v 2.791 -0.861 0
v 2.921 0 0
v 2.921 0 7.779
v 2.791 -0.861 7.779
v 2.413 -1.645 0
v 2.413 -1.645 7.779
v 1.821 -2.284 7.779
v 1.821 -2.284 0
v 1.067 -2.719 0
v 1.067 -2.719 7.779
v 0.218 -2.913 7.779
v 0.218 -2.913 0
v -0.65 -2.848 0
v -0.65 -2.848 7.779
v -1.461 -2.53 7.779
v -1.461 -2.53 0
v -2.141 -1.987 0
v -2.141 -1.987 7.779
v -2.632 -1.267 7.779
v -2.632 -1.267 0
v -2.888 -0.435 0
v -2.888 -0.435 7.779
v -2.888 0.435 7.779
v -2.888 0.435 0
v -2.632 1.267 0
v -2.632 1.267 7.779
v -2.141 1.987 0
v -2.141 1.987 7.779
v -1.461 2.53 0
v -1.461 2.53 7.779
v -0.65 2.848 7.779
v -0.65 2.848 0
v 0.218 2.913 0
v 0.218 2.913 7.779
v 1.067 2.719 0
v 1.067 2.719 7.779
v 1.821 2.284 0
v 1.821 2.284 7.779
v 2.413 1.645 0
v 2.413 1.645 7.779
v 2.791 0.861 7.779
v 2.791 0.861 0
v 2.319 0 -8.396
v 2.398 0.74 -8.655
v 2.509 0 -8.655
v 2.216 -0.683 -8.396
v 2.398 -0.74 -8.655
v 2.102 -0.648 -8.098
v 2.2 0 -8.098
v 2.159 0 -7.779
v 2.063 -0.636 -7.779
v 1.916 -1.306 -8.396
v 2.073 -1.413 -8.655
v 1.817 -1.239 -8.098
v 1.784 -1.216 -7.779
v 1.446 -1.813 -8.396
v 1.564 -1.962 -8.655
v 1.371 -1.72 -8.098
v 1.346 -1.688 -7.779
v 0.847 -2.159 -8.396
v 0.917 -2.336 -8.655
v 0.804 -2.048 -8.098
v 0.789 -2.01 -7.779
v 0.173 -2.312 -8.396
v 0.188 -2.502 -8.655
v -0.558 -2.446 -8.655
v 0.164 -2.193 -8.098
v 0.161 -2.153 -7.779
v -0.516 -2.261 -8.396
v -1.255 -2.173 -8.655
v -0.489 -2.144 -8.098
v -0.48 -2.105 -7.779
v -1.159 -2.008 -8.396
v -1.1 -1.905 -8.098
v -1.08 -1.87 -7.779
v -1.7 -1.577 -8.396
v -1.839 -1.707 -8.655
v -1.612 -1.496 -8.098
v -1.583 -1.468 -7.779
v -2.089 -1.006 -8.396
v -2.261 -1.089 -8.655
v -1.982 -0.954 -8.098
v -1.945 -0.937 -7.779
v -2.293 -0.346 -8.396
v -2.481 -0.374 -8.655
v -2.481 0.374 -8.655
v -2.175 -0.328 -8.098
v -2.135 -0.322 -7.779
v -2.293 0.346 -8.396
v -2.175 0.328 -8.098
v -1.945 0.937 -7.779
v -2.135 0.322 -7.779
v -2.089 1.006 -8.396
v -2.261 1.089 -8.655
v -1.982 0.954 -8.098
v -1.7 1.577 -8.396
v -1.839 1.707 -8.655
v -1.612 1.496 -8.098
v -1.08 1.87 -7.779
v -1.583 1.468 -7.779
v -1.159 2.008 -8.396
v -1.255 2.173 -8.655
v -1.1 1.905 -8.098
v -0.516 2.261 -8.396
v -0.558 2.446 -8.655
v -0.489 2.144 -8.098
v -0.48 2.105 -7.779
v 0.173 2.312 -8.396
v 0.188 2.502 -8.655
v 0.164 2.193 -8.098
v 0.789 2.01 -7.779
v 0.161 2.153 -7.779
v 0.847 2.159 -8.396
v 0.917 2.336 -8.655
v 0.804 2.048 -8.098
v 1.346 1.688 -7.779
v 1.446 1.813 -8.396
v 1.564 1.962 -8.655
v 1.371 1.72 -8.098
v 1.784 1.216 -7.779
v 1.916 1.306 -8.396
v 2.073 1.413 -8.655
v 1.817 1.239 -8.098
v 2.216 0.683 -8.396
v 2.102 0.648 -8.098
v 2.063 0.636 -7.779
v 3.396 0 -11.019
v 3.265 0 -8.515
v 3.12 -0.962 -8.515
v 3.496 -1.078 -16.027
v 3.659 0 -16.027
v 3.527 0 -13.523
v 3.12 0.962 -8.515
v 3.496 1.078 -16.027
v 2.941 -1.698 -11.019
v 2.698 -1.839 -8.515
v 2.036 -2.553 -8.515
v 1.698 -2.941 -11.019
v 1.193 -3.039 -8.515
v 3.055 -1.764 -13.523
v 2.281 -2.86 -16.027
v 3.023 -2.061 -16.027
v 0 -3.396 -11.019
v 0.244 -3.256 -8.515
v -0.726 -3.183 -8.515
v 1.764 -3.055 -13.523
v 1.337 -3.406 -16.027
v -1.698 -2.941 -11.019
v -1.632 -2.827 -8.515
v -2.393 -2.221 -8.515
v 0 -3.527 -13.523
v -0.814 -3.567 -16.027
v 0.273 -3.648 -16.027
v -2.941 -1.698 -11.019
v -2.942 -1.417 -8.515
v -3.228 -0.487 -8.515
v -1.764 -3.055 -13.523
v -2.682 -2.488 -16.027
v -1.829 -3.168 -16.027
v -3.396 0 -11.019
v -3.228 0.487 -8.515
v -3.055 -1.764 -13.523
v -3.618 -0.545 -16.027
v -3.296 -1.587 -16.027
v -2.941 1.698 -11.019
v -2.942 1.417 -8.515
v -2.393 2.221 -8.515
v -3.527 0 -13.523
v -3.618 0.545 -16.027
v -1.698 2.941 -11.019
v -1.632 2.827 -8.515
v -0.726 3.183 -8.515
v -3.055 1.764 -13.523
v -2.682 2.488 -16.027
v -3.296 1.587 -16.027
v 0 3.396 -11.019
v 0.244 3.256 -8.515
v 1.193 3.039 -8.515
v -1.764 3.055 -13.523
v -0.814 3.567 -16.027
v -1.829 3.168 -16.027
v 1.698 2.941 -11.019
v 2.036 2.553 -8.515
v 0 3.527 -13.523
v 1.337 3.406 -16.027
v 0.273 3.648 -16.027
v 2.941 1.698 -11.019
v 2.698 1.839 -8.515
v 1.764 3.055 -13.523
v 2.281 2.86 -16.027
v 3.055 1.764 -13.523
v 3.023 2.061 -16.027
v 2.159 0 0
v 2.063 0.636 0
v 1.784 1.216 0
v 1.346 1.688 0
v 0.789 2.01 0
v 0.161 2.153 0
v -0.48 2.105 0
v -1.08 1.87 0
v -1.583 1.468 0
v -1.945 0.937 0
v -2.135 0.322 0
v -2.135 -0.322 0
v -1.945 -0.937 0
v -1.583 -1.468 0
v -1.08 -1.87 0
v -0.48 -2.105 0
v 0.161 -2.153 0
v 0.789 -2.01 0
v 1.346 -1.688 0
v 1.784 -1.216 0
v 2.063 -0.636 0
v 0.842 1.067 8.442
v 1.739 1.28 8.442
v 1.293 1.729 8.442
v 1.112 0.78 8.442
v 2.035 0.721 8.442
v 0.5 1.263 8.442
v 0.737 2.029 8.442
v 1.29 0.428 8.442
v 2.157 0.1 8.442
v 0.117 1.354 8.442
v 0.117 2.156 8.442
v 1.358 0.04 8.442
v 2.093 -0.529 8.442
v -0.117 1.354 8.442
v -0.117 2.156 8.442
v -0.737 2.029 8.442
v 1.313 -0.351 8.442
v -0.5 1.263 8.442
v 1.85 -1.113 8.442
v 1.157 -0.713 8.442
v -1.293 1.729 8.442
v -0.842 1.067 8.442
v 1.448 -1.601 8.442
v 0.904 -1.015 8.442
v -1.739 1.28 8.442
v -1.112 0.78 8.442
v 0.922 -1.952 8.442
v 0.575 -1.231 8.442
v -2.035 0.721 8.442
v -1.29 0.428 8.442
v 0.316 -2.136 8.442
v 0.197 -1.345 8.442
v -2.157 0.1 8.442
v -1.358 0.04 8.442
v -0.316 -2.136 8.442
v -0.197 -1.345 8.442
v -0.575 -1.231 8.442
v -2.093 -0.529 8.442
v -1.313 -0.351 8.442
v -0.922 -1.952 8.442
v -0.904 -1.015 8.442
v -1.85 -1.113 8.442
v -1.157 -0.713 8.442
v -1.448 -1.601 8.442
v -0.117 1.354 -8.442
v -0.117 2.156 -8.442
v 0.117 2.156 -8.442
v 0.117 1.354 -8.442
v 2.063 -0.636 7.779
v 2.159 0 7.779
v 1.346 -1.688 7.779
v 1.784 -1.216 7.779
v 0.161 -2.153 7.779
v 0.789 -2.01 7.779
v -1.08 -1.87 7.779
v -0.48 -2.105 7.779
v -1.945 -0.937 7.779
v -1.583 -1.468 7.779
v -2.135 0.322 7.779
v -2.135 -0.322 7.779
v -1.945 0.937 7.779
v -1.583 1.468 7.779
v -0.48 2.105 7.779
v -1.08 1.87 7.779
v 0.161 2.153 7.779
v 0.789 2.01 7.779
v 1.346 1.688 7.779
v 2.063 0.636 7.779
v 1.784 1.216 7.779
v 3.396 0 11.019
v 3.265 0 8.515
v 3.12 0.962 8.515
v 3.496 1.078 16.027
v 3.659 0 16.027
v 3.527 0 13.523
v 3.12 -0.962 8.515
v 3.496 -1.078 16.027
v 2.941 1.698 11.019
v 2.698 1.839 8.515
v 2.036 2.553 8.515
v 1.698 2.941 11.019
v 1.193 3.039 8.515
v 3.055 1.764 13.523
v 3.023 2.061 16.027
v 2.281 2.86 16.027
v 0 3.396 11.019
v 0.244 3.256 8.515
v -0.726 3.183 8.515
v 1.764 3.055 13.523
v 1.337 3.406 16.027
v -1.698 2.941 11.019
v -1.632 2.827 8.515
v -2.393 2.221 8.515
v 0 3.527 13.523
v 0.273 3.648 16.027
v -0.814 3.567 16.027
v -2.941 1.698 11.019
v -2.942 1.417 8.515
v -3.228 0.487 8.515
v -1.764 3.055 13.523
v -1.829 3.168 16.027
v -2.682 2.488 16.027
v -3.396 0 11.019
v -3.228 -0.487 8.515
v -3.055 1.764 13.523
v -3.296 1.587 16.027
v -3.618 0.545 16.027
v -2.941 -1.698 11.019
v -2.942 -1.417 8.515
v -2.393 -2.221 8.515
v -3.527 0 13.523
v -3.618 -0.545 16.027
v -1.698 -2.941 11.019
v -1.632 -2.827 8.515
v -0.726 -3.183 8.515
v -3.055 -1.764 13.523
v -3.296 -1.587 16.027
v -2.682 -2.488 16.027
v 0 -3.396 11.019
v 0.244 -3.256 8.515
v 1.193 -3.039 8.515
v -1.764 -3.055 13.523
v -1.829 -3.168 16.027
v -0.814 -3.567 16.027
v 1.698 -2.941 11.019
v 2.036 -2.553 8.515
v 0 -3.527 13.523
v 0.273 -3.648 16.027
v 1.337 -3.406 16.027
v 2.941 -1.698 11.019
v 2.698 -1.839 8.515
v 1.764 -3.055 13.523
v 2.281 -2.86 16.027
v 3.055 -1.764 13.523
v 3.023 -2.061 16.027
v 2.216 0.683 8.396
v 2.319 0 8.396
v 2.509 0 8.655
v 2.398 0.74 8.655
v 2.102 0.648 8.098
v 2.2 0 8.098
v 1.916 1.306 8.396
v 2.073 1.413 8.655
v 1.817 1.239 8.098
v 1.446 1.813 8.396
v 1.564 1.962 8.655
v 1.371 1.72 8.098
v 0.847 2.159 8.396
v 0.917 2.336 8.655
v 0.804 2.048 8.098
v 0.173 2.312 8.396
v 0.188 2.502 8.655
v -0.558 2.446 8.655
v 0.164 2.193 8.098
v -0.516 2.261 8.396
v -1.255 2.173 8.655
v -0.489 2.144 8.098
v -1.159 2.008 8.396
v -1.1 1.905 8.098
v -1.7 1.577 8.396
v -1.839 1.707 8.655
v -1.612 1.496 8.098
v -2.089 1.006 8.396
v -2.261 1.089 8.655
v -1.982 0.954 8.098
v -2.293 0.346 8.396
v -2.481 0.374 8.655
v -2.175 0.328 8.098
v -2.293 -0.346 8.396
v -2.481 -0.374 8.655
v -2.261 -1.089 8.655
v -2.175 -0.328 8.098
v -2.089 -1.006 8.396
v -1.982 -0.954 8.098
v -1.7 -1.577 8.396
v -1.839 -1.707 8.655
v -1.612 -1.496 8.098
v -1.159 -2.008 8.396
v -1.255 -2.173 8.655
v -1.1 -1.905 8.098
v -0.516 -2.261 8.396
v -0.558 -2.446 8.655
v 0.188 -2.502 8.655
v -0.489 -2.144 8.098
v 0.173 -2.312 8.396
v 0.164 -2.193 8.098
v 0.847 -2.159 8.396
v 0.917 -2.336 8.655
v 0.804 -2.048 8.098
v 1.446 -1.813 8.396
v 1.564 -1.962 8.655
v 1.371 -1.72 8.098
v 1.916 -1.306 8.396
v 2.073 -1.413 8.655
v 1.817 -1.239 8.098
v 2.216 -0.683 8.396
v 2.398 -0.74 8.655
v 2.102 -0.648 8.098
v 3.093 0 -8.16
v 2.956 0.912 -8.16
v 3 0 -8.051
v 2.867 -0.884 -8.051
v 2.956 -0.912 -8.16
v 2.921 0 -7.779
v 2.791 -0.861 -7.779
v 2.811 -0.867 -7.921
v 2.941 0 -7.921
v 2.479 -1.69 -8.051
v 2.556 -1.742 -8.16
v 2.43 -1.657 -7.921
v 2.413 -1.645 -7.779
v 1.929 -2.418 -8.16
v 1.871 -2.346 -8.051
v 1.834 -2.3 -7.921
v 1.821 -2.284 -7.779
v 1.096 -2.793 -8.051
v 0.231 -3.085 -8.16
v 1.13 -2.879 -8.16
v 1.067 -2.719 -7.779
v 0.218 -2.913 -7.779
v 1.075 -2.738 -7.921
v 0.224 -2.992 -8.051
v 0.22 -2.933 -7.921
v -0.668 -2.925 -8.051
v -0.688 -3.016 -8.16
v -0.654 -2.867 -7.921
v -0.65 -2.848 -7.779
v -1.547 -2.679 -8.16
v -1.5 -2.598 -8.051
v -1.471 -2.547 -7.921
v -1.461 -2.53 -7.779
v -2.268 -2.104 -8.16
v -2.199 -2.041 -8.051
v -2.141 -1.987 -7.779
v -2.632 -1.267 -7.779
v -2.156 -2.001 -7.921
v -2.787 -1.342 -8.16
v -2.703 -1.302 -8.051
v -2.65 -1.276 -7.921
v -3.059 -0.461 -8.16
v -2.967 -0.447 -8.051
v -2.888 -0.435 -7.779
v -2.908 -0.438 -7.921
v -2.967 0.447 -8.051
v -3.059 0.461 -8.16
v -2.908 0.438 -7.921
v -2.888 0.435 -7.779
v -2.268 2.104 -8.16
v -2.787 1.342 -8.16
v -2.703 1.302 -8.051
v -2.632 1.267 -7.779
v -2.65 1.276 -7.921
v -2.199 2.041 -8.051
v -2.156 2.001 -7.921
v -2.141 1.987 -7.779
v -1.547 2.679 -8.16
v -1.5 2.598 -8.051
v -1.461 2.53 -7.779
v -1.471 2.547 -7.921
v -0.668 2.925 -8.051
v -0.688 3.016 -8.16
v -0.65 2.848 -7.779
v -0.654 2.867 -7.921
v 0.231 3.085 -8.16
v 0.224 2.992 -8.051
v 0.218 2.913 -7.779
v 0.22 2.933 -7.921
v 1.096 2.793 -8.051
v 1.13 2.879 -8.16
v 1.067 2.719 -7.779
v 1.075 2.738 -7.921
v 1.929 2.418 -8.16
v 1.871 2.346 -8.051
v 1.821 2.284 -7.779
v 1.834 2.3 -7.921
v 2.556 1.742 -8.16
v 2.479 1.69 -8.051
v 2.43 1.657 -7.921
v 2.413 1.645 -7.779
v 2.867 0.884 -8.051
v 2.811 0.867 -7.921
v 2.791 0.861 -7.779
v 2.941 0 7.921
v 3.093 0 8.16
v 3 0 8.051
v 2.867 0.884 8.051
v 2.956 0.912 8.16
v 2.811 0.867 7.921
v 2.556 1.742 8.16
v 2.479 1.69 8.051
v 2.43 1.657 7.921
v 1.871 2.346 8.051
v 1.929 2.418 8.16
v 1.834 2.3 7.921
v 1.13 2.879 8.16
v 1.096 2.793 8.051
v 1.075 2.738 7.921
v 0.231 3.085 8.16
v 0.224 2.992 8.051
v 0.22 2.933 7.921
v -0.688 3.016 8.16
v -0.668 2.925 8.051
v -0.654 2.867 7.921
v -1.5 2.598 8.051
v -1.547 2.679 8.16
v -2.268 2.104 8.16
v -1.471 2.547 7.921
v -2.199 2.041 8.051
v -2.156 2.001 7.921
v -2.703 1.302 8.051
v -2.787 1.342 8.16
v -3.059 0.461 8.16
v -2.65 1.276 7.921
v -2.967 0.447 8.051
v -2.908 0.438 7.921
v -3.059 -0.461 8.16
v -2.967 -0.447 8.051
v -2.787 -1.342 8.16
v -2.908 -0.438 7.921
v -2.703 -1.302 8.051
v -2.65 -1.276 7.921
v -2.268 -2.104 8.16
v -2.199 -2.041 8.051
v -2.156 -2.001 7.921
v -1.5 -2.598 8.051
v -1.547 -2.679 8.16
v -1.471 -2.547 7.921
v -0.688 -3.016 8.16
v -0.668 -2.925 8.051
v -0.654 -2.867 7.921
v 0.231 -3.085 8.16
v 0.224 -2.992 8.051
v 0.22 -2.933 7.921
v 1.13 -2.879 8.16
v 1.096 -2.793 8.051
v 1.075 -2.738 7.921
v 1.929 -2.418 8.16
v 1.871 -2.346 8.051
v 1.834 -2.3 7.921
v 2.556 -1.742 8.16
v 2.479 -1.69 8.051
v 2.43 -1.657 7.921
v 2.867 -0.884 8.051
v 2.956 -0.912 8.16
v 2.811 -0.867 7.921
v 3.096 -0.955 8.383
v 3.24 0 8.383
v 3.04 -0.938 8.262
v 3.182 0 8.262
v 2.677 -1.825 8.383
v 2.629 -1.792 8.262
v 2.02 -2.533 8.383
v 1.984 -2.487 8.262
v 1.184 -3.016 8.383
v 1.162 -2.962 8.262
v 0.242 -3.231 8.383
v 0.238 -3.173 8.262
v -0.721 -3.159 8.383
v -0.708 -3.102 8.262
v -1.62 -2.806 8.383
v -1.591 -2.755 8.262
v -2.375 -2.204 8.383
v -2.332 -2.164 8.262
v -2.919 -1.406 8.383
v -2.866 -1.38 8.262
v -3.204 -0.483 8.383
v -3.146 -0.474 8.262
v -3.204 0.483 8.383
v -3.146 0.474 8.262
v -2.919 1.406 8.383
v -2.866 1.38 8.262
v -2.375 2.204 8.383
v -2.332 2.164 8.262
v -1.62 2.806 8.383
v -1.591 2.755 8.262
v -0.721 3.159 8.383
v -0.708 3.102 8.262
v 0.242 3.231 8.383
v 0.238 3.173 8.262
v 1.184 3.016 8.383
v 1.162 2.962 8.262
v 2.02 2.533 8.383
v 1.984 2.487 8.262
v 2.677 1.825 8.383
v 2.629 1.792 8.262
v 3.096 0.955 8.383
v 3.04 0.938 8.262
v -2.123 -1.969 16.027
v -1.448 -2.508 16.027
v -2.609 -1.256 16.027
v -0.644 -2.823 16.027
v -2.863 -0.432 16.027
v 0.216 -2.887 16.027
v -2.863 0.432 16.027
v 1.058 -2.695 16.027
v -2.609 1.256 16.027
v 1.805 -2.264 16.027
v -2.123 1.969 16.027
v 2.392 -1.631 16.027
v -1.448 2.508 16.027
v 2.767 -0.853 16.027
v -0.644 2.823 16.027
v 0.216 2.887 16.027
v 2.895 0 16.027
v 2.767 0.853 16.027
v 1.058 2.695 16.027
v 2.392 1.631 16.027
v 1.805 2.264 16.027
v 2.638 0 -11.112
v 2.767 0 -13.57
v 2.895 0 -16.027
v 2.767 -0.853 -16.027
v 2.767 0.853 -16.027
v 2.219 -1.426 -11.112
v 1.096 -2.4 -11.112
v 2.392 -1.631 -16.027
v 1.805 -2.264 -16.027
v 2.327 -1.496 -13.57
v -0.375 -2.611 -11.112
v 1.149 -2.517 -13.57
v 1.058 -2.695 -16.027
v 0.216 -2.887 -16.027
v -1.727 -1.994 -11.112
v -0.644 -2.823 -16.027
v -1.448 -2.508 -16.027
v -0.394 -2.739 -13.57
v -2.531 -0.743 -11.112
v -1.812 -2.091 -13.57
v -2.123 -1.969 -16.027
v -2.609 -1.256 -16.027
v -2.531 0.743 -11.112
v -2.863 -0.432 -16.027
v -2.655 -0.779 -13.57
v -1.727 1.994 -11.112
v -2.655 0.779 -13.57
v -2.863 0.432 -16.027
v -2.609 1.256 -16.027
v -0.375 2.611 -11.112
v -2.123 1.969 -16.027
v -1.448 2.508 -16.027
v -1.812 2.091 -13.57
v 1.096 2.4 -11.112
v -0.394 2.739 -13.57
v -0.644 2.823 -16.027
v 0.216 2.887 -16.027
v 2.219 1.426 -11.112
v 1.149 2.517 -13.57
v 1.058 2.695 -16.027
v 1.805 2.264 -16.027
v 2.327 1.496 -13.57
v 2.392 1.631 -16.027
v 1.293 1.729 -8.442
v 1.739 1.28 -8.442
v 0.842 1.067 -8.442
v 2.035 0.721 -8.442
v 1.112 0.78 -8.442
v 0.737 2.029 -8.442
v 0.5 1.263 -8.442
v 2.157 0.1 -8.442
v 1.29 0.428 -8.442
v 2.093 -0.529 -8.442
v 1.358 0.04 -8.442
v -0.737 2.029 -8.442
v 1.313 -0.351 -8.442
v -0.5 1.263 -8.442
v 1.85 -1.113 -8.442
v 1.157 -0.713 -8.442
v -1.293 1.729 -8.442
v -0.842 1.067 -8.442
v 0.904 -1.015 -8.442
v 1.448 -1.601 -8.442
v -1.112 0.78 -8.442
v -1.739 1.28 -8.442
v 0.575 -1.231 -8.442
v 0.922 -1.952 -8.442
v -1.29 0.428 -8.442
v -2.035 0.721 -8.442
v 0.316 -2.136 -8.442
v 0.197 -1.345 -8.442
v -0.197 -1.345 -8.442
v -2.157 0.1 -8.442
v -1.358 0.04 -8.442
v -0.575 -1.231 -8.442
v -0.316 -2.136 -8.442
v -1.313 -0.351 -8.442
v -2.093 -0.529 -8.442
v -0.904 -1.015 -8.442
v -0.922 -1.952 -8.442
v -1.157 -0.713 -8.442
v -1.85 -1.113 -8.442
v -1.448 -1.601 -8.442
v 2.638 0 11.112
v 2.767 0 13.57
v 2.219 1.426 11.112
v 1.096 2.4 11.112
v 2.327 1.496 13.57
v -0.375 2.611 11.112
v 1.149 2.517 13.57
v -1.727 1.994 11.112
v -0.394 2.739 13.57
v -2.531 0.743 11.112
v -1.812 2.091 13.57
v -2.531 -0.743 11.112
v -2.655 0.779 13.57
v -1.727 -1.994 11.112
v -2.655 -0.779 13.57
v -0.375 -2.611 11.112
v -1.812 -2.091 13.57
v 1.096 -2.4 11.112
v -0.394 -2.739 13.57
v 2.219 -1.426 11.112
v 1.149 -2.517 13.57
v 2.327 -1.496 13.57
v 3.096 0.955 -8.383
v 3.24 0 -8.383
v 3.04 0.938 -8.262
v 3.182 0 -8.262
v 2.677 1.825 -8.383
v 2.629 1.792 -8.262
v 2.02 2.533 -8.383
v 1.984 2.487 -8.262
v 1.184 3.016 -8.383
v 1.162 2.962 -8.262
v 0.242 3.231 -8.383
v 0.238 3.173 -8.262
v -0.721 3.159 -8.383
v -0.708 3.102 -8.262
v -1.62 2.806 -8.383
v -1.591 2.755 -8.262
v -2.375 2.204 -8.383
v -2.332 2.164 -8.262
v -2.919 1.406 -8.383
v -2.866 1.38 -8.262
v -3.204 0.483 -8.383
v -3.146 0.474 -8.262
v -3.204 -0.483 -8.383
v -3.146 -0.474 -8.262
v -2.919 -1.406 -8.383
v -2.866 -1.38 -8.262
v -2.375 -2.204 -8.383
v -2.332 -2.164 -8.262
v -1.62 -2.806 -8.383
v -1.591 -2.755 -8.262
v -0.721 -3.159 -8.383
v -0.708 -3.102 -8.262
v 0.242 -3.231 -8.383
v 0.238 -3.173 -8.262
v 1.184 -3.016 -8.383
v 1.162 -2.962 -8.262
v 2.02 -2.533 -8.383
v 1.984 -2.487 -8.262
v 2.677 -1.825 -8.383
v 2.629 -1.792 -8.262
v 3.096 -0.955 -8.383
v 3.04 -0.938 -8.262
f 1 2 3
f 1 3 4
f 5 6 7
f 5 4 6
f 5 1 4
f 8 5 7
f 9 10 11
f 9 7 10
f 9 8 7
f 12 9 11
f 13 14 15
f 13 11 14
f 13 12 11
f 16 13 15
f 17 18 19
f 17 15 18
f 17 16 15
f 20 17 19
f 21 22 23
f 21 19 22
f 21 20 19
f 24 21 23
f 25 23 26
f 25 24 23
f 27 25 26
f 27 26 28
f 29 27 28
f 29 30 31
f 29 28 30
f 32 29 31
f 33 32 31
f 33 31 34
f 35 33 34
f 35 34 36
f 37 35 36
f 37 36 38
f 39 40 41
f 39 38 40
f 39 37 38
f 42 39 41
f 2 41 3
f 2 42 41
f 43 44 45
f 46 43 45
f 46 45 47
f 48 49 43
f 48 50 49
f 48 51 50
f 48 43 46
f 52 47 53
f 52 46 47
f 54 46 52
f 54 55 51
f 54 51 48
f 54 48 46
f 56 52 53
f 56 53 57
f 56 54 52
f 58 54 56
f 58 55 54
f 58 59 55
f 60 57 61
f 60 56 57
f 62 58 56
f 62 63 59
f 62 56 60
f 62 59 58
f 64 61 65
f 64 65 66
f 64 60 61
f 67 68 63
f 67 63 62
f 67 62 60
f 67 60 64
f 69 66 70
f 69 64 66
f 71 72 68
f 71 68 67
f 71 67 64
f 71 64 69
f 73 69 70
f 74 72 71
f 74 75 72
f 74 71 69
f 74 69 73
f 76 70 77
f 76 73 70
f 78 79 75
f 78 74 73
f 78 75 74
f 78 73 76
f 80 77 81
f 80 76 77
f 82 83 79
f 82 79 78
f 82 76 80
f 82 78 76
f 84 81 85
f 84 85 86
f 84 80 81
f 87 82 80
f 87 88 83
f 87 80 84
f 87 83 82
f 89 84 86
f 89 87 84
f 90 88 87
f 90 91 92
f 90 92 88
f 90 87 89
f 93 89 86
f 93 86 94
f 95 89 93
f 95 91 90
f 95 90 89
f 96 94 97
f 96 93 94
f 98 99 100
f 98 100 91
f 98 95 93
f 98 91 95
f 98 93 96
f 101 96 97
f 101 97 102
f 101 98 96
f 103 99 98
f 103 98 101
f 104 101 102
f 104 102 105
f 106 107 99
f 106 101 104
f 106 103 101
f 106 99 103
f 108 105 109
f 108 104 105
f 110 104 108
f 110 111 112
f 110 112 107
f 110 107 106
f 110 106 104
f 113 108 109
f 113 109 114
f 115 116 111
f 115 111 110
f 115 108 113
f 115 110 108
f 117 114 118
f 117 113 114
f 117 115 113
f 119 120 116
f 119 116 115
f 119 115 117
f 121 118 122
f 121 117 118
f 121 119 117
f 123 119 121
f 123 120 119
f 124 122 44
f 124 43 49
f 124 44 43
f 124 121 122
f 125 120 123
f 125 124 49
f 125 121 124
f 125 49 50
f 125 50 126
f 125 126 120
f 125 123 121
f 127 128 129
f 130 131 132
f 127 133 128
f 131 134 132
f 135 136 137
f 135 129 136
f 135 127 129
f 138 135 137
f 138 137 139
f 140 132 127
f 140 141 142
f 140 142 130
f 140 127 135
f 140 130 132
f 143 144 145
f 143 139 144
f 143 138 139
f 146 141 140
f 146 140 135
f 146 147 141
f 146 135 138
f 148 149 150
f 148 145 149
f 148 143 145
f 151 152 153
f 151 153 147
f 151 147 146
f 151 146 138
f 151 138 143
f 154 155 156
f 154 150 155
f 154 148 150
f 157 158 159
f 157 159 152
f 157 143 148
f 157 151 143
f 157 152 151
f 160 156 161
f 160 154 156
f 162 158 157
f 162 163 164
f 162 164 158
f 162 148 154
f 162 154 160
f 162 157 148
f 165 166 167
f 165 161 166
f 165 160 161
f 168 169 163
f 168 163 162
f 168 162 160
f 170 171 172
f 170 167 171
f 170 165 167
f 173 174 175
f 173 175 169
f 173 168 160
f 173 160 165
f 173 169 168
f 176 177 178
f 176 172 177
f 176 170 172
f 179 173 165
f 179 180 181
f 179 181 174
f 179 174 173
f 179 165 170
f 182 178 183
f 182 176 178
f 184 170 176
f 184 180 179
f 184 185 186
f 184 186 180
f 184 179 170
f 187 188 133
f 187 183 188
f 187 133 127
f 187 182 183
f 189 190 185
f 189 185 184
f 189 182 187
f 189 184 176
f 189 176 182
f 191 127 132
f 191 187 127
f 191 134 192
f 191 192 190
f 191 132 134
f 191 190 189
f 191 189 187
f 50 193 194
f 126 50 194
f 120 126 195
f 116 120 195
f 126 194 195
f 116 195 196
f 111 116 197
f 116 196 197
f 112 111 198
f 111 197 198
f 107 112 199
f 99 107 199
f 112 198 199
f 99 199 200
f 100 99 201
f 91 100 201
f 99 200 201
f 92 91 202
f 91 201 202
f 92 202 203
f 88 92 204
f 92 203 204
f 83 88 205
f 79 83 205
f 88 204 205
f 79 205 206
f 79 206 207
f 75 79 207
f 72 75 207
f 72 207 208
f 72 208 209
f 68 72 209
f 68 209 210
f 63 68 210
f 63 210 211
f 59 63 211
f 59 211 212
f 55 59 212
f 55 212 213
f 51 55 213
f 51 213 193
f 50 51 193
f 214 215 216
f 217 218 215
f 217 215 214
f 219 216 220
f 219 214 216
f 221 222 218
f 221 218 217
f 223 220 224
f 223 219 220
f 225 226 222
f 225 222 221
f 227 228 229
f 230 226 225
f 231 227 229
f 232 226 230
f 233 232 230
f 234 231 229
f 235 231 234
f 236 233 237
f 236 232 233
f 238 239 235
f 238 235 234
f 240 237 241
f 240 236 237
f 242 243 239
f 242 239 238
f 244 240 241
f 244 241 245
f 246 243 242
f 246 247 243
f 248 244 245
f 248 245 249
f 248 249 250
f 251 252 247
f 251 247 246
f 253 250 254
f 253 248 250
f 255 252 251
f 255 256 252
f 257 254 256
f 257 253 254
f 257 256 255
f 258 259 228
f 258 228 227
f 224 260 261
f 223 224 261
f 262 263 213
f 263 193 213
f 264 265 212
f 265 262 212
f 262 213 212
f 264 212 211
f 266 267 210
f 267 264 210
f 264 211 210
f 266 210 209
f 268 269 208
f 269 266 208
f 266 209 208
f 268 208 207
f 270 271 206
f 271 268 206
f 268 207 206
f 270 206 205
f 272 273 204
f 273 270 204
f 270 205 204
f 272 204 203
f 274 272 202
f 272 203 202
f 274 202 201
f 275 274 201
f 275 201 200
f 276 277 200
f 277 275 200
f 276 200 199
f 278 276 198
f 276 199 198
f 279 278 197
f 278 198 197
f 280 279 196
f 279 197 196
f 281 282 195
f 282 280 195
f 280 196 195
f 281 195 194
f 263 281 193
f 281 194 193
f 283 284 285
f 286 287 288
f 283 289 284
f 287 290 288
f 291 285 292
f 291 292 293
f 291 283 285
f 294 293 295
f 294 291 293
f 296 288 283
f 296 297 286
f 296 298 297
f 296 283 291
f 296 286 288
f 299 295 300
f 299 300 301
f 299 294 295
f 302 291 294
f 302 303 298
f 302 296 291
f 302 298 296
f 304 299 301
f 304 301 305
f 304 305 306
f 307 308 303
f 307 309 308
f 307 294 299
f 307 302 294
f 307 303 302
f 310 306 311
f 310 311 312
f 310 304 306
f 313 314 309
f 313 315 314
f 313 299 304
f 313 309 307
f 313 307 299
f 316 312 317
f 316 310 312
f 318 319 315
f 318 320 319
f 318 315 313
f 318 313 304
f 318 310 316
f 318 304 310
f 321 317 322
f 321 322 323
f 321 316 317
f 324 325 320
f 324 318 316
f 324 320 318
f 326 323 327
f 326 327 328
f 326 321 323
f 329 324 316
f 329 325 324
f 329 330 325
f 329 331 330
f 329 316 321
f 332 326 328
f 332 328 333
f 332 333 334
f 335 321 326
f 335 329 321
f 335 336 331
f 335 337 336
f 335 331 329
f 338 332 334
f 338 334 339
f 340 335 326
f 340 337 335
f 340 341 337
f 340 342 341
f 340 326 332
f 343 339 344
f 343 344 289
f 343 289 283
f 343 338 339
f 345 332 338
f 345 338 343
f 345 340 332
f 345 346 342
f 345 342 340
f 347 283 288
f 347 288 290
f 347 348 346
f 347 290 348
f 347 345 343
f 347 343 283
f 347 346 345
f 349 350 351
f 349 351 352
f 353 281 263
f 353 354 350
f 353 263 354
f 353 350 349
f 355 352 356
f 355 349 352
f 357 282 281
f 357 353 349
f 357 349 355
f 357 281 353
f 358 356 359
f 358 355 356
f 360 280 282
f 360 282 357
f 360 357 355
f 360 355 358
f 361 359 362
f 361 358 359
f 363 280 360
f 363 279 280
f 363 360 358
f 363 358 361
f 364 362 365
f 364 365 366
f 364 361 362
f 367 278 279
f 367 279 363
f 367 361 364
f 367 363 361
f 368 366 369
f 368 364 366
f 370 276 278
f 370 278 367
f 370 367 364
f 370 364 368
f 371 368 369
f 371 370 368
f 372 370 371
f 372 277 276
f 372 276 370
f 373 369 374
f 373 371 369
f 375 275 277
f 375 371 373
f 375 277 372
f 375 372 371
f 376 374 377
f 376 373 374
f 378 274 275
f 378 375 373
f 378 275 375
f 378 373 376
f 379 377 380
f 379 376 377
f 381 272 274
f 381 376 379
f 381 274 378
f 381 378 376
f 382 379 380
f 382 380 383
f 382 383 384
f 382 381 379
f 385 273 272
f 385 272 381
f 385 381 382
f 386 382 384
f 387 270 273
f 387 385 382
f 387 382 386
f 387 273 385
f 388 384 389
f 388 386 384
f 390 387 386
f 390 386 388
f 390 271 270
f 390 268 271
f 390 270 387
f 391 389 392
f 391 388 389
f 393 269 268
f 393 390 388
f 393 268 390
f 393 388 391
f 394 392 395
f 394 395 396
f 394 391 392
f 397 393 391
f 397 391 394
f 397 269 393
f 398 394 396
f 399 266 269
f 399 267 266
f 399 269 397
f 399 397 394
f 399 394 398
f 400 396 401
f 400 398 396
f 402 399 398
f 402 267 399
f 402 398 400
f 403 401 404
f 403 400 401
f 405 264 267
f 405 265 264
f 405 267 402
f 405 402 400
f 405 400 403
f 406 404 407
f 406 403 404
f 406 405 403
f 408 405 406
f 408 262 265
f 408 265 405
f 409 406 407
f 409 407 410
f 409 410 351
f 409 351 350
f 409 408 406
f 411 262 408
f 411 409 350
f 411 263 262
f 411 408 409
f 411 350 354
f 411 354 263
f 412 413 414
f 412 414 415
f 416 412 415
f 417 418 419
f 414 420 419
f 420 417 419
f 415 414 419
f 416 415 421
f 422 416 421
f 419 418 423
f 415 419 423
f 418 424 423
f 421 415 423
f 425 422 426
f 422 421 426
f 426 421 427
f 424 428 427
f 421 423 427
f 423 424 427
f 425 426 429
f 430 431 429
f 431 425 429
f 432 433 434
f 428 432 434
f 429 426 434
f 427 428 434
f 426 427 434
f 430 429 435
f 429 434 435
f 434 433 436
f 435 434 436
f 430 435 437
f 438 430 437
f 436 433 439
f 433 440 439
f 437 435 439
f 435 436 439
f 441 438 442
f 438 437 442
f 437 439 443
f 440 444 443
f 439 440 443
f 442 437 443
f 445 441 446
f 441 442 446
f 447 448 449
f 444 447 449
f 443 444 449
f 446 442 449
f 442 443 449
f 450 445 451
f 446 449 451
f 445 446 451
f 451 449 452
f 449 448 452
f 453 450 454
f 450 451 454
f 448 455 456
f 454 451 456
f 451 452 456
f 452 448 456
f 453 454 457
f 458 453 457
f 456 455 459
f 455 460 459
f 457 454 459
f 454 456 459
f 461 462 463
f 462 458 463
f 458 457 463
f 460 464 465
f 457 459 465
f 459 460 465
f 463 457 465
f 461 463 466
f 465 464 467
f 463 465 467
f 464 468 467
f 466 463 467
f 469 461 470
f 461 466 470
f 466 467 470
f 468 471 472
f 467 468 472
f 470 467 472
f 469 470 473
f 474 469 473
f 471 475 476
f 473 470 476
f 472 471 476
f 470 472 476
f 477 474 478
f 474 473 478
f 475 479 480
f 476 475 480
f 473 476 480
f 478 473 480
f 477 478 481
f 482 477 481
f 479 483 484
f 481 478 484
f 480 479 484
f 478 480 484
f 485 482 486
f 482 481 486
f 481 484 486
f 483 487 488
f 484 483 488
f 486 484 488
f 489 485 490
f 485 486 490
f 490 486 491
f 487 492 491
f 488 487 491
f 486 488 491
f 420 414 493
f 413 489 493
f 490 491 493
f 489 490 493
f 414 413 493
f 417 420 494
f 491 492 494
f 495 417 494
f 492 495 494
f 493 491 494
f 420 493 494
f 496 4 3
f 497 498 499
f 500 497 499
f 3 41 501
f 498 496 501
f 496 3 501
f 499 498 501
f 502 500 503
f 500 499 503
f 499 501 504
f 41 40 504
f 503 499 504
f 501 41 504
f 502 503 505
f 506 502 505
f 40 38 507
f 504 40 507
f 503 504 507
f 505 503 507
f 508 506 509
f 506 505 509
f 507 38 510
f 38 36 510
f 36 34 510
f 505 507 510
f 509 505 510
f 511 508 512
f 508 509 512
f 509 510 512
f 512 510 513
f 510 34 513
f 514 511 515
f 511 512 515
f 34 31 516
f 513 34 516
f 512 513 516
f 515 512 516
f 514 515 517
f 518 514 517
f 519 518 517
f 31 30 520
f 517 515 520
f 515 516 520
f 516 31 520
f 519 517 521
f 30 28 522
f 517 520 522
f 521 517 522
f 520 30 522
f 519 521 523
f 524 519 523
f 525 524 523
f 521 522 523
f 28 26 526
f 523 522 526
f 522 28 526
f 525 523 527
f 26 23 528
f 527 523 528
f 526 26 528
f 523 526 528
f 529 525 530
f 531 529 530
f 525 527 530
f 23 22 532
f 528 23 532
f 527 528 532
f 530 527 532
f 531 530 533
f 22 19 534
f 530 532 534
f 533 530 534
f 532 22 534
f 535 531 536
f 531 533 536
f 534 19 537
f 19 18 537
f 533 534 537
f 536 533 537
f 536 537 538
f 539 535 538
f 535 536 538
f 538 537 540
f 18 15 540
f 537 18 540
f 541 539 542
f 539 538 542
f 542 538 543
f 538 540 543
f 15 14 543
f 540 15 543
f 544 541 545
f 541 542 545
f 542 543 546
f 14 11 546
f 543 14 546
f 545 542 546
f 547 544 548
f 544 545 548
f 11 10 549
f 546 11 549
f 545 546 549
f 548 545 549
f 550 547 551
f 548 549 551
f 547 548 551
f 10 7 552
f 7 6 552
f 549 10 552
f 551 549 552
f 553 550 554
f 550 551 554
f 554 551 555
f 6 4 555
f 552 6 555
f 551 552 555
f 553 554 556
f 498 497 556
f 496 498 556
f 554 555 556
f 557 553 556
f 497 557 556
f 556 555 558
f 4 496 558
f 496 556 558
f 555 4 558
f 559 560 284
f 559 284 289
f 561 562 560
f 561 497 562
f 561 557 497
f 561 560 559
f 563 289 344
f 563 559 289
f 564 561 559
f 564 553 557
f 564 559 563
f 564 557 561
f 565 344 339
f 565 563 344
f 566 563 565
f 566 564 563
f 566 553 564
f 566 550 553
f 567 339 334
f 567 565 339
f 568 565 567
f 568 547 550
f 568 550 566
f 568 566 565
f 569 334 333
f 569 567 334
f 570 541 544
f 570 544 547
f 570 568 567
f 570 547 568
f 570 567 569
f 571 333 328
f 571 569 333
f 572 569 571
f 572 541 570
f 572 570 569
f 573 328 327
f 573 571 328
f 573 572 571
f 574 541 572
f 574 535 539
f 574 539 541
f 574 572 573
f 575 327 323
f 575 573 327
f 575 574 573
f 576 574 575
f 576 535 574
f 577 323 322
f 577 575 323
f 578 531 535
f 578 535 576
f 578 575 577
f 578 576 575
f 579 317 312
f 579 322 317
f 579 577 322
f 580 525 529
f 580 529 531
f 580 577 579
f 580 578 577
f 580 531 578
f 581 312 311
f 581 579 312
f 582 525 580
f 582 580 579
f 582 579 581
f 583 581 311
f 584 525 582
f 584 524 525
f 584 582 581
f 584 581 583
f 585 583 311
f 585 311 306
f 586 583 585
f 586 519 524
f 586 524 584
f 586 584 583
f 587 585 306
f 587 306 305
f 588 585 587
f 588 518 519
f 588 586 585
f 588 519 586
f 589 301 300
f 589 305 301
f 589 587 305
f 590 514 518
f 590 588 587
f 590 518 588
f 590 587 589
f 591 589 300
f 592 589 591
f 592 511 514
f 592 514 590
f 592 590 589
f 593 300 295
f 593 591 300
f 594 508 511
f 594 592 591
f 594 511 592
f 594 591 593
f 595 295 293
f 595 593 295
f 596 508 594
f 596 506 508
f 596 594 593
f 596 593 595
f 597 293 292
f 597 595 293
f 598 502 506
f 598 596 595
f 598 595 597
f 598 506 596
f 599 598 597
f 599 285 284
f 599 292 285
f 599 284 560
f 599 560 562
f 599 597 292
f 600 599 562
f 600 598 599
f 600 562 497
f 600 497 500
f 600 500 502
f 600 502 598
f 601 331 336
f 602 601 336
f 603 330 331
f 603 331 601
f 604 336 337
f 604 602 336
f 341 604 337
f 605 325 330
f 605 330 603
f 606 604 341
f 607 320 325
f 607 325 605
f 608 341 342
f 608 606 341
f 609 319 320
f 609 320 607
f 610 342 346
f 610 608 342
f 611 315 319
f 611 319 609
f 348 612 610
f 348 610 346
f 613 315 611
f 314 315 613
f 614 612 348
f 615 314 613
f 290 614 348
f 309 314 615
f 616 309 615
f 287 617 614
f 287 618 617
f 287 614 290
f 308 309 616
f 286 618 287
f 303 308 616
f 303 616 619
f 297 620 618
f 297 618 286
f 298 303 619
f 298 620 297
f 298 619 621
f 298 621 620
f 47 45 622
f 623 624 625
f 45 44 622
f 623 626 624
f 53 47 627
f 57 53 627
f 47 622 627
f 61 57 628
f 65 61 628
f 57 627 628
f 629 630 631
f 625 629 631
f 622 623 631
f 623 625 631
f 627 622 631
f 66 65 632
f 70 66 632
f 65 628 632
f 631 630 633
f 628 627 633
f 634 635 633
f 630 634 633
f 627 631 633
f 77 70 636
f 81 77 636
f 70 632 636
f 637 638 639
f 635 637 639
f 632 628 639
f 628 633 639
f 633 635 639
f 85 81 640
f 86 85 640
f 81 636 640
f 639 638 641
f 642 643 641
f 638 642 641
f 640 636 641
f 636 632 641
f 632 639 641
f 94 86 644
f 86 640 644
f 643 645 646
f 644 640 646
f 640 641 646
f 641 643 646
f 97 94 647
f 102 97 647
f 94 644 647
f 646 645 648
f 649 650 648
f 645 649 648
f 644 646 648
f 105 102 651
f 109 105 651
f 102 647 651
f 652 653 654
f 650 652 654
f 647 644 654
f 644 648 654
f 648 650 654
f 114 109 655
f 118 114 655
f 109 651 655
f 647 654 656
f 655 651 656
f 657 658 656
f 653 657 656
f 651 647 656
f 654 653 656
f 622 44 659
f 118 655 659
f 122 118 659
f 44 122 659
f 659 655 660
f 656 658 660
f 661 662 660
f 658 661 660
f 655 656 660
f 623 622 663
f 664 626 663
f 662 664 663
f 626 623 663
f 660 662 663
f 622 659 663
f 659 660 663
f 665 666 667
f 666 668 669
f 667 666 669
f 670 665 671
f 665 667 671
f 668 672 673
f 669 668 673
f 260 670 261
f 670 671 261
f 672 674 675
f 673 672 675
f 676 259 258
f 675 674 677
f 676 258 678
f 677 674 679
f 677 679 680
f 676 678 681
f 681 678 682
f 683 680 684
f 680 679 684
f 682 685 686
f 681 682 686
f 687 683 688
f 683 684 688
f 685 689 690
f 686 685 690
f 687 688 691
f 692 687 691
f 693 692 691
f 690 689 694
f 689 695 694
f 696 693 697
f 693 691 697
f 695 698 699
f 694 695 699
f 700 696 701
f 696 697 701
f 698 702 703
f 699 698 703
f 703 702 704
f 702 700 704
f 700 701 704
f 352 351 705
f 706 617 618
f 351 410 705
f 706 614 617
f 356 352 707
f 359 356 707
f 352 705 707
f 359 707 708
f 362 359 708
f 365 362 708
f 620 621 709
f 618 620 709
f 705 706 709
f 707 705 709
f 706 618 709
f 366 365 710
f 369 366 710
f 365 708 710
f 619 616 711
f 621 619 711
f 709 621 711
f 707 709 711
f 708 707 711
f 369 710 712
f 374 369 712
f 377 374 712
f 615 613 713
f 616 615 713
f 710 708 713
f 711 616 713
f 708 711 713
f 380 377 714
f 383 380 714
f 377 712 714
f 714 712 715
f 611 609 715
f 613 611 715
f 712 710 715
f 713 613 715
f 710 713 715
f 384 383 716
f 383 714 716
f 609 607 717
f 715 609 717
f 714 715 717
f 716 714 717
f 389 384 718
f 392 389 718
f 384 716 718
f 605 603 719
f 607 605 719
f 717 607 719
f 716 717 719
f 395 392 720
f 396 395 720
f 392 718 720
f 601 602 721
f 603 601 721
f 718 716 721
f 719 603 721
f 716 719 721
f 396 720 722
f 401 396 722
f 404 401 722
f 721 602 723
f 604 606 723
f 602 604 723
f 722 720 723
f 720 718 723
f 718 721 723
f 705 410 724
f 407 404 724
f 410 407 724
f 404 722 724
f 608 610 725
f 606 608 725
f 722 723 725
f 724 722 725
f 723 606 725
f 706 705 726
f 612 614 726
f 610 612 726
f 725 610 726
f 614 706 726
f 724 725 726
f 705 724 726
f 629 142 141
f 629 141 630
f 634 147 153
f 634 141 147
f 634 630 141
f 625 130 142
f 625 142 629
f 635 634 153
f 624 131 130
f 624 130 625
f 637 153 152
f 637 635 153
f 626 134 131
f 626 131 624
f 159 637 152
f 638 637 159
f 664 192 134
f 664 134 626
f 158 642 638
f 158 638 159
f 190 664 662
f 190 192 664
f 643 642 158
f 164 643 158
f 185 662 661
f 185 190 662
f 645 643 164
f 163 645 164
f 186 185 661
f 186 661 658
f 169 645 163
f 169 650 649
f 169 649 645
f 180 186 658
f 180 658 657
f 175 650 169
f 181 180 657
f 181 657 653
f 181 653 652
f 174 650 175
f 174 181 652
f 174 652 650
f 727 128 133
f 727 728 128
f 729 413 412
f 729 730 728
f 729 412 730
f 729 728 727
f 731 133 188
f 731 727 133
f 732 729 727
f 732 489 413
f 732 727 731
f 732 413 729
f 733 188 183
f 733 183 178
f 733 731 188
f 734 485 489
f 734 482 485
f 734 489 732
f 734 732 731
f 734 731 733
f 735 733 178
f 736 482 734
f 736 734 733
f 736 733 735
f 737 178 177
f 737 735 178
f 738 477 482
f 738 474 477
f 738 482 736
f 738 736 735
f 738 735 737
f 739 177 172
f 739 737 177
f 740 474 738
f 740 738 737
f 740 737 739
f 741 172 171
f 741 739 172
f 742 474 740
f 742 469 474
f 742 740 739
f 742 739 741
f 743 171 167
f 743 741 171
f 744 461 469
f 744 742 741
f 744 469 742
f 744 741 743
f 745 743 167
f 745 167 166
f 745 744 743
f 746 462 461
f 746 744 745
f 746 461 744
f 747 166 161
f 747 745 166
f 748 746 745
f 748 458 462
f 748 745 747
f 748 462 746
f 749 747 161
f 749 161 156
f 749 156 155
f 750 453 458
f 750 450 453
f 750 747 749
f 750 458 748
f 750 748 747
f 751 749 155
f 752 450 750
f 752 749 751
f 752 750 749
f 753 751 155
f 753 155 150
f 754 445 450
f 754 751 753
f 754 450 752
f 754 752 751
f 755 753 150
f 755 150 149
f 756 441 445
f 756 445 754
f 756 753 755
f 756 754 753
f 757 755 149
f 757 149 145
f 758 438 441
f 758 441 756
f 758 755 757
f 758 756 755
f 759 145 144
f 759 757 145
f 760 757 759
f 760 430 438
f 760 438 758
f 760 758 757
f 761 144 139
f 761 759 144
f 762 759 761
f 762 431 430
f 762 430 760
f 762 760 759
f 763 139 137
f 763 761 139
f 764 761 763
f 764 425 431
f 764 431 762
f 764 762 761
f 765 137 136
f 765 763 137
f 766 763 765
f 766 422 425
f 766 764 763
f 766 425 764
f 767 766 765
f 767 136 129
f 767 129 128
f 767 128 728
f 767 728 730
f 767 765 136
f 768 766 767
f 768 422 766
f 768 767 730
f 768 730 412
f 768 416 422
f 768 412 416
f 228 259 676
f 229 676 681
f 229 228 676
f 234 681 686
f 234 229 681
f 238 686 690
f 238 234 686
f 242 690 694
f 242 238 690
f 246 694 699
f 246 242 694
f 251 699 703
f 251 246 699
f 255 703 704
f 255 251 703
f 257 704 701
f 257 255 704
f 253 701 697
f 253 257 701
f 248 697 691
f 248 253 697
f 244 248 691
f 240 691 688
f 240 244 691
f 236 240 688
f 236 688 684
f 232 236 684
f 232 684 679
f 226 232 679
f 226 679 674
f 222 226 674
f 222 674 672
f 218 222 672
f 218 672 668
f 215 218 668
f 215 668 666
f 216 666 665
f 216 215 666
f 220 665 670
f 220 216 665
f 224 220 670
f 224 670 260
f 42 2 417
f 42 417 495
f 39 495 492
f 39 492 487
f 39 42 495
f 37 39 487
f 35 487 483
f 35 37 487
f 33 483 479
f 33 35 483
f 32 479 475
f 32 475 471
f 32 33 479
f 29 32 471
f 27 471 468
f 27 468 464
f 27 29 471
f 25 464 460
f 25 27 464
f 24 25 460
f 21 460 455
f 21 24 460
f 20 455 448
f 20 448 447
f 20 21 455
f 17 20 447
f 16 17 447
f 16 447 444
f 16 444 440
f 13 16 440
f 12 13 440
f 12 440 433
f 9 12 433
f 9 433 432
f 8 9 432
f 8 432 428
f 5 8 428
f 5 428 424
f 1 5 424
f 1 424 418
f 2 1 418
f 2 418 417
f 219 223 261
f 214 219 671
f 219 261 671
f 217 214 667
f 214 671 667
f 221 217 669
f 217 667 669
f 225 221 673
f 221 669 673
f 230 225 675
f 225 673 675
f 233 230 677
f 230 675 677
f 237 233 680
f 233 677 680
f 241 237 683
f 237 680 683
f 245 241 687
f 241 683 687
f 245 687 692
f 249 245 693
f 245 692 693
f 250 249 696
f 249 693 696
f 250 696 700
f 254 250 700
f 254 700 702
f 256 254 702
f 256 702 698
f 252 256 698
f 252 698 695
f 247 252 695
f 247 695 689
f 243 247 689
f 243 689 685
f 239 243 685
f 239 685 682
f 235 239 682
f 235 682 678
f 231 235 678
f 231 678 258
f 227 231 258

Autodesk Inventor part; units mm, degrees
ref_plane "YZ Plane" through (0, 0, 0) normal (1, 0, 0) x (0, 1, 0)
ref_plane "XZ Plane" through (0, 0, 0) normal (0, 1, 0) x (-1, 0, 0)
ref_plane "XY Plane" through (0, 0, 0) normal (0, 0, 1) x (1, 0, 0)
sketch "Sketch1" plane through (0, 0, 0) normal (0, 0, 1) x (1, 0, 0)
  circle A0 centre (0, 0) radius 2.921
  dimension "d0" = 5.842
extrude "Extrusion1" add sketch "Sketch1" along normal mid plane 16.51
sketch "Sketch2" plane through (0, 0, 8.255) normal (0, 0, 1) x (1, 0, 0)
  circle A0 centre (0, 0) radius 2.921 construction
  circle A1 centre (0, 0) radius 3.2512
  dimension "d3" = 6.5024
extrude "Extrusion2" add sketch "Sketch2" along normal blind 7.7724 draft 3
fillet "Fillet1" radius 0.508 2 edges at (-2.921, 0, 8.255) (-3.2512, 0, 8.255)
mirror "Mirror1" about plane through (0, 0, 0) normal (0, 0, 1) of "Extrusion2", "Fillet1"
shell "Shell1" thickness 0.762 removed faces 2 at (1.0171, -0.0499, 16.0274) at (1.0171, -0.0499, -16.0274)
sketch "Sketch3" plane through (0, 0, 0) normal (0, 1, 0) x (-1, 0, 0)
  arc A0 (-3.2648, 8.515) -> (-3.0933, 8.1604) centre (-2.7575, 8.5416) ccw projected
  line L0 (-3.2648, 8.515) -> (-3.6585, 16.0274) projected
  line L1 (-3.6585, 16.0274) -> (-2.8955, 16.0274) projected
  line L2 (-2.8955, 16.0274) -> (-2.5091, 8.6547) projected
  arc A1 (-2.159, 7.7791) -> (-2.5091, 8.6547) centre (-3.429, 7.7791) ccw projected
  line L3 (-2.159, 7.7791) -> (-2.159, -7.7791) projected
  arc A2 (-2.5091, -8.6547) -> (-2.159, -7.7791) centre (-3.429, -7.7791) ccw projected
  line L4 (-2.5091, -8.6547) -> (-2.8955, -16.0274) projected
  line L5 (-2.8955, -16.0274) -> (-3.6585, -16.0274) projected
  line L6 (-3.6585, -16.0274) -> (-3.2648, -8.515) projected
  arc A3 (-3.0933, -8.1604) -> (-3.2648, -8.515) centre (-2.7575, -8.5416) ccw projected
  arc A4 (-3.0933, -8.1604) -> (-2.921, -7.7791) centre (-3.429, -7.7791) ccw projected
  line L7 (-2.921, -7.7791) -> (-2.921, 7.7791) projected
  arc A5 (-2.921, 7.7791) -> (-3.0933, 8.1604) centre (-3.429, 7.7791) ccw projected
  arc A6 (3.0933, 8.1604) -> (3.2648, 8.515) centre (2.7575, 8.5416) ccw projected
  arc A7 (3.0933, 8.1604) -> (2.921, 7.7791) centre (3.429, 7.7791) ccw projected
  line L8 (2.921, 7.7791) -> (2.921, -7.7791) projected
  arc A8 (2.921, -7.7791) -> (3.0933, -8.1604) centre (3.429, -7.7791) ccw projected
  arc A9 (3.2648, -8.515) -> (3.0933, -8.1604) centre (2.7575, -8.5416) ccw projected
  line L9 (3.2648, -8.515) -> (3.6585, -16.0274) projected
  line L10 (3.6585, -16.0274) -> (2.8955, -16.0274) projected
  line L11 (2.8955, -16.0274) -> (2.5091, -8.6547) projected
  arc A10 (2.159, -7.7791) -> (2.5091, -8.6547) centre (3.429, -7.7791) ccw projected
  line L12 (2.159, -7.7791) -> (2.159, 7.7791) projected
  arc A11 (2.5091, 8.6547) -> (2.159, 7.7791) centre (3.429, 7.7791) ccw projected
  line L13 (2.5091, 8.6547) -> (2.8955, 16.0274) projected
  line L14 (2.8955, 16.0274) -> (3.6585, 16.0274) projected
  line L15 (3.6585, 16.0274) -> (3.2648, 8.515) projected
  line L16 (1.3589, -8.4415) -> (2.159, -8.4415)
  line L17 (2.159, -8.4415) -> (2.159, 8.4415)
  line L18 (2.159, 8.4415) -> (1.3589, 8.4415)
  line L19 (1.3589, 8.4415) -> (1.3589, -8.4415)
  line L20 (0, 0) -> (5.4328, 0) construction
  line L21 (0, -22.4384) -> (0, 22.4384) projected
  dimension "d8" = 0.8001
revolve "Revolution1" add sketch "Sketch3" angle 360 about axis through (0, 0, -10) along (0, 0, 1) separate body contours L12 L17 L16 L19 L18
sketch "Sketch4" plane through (0, 0, 8.4415) normal (0, 0, 1) x (1, 0, 0)
  circle A0 centre (0, 0) radius 1.3589 projected
  circle A1 centre (0, 0) radius 2.159 projected
  line L0 (0, 0) -> (0, 3.9072) construction
  line L1 (-0.1168, 2.1558) -> (-0.1168, 1.3539)
  line L2 (0.1168, 2.1558) -> (0.1168, 1.3539)
extrude "Extrusion3" cut sketch "Sketch4" against normal through all contours A0 L1 A1 L2 picked at (0.0909, 1.6227) bodies 2
properties part number "16-14 double sided femal tube heat shrink"
